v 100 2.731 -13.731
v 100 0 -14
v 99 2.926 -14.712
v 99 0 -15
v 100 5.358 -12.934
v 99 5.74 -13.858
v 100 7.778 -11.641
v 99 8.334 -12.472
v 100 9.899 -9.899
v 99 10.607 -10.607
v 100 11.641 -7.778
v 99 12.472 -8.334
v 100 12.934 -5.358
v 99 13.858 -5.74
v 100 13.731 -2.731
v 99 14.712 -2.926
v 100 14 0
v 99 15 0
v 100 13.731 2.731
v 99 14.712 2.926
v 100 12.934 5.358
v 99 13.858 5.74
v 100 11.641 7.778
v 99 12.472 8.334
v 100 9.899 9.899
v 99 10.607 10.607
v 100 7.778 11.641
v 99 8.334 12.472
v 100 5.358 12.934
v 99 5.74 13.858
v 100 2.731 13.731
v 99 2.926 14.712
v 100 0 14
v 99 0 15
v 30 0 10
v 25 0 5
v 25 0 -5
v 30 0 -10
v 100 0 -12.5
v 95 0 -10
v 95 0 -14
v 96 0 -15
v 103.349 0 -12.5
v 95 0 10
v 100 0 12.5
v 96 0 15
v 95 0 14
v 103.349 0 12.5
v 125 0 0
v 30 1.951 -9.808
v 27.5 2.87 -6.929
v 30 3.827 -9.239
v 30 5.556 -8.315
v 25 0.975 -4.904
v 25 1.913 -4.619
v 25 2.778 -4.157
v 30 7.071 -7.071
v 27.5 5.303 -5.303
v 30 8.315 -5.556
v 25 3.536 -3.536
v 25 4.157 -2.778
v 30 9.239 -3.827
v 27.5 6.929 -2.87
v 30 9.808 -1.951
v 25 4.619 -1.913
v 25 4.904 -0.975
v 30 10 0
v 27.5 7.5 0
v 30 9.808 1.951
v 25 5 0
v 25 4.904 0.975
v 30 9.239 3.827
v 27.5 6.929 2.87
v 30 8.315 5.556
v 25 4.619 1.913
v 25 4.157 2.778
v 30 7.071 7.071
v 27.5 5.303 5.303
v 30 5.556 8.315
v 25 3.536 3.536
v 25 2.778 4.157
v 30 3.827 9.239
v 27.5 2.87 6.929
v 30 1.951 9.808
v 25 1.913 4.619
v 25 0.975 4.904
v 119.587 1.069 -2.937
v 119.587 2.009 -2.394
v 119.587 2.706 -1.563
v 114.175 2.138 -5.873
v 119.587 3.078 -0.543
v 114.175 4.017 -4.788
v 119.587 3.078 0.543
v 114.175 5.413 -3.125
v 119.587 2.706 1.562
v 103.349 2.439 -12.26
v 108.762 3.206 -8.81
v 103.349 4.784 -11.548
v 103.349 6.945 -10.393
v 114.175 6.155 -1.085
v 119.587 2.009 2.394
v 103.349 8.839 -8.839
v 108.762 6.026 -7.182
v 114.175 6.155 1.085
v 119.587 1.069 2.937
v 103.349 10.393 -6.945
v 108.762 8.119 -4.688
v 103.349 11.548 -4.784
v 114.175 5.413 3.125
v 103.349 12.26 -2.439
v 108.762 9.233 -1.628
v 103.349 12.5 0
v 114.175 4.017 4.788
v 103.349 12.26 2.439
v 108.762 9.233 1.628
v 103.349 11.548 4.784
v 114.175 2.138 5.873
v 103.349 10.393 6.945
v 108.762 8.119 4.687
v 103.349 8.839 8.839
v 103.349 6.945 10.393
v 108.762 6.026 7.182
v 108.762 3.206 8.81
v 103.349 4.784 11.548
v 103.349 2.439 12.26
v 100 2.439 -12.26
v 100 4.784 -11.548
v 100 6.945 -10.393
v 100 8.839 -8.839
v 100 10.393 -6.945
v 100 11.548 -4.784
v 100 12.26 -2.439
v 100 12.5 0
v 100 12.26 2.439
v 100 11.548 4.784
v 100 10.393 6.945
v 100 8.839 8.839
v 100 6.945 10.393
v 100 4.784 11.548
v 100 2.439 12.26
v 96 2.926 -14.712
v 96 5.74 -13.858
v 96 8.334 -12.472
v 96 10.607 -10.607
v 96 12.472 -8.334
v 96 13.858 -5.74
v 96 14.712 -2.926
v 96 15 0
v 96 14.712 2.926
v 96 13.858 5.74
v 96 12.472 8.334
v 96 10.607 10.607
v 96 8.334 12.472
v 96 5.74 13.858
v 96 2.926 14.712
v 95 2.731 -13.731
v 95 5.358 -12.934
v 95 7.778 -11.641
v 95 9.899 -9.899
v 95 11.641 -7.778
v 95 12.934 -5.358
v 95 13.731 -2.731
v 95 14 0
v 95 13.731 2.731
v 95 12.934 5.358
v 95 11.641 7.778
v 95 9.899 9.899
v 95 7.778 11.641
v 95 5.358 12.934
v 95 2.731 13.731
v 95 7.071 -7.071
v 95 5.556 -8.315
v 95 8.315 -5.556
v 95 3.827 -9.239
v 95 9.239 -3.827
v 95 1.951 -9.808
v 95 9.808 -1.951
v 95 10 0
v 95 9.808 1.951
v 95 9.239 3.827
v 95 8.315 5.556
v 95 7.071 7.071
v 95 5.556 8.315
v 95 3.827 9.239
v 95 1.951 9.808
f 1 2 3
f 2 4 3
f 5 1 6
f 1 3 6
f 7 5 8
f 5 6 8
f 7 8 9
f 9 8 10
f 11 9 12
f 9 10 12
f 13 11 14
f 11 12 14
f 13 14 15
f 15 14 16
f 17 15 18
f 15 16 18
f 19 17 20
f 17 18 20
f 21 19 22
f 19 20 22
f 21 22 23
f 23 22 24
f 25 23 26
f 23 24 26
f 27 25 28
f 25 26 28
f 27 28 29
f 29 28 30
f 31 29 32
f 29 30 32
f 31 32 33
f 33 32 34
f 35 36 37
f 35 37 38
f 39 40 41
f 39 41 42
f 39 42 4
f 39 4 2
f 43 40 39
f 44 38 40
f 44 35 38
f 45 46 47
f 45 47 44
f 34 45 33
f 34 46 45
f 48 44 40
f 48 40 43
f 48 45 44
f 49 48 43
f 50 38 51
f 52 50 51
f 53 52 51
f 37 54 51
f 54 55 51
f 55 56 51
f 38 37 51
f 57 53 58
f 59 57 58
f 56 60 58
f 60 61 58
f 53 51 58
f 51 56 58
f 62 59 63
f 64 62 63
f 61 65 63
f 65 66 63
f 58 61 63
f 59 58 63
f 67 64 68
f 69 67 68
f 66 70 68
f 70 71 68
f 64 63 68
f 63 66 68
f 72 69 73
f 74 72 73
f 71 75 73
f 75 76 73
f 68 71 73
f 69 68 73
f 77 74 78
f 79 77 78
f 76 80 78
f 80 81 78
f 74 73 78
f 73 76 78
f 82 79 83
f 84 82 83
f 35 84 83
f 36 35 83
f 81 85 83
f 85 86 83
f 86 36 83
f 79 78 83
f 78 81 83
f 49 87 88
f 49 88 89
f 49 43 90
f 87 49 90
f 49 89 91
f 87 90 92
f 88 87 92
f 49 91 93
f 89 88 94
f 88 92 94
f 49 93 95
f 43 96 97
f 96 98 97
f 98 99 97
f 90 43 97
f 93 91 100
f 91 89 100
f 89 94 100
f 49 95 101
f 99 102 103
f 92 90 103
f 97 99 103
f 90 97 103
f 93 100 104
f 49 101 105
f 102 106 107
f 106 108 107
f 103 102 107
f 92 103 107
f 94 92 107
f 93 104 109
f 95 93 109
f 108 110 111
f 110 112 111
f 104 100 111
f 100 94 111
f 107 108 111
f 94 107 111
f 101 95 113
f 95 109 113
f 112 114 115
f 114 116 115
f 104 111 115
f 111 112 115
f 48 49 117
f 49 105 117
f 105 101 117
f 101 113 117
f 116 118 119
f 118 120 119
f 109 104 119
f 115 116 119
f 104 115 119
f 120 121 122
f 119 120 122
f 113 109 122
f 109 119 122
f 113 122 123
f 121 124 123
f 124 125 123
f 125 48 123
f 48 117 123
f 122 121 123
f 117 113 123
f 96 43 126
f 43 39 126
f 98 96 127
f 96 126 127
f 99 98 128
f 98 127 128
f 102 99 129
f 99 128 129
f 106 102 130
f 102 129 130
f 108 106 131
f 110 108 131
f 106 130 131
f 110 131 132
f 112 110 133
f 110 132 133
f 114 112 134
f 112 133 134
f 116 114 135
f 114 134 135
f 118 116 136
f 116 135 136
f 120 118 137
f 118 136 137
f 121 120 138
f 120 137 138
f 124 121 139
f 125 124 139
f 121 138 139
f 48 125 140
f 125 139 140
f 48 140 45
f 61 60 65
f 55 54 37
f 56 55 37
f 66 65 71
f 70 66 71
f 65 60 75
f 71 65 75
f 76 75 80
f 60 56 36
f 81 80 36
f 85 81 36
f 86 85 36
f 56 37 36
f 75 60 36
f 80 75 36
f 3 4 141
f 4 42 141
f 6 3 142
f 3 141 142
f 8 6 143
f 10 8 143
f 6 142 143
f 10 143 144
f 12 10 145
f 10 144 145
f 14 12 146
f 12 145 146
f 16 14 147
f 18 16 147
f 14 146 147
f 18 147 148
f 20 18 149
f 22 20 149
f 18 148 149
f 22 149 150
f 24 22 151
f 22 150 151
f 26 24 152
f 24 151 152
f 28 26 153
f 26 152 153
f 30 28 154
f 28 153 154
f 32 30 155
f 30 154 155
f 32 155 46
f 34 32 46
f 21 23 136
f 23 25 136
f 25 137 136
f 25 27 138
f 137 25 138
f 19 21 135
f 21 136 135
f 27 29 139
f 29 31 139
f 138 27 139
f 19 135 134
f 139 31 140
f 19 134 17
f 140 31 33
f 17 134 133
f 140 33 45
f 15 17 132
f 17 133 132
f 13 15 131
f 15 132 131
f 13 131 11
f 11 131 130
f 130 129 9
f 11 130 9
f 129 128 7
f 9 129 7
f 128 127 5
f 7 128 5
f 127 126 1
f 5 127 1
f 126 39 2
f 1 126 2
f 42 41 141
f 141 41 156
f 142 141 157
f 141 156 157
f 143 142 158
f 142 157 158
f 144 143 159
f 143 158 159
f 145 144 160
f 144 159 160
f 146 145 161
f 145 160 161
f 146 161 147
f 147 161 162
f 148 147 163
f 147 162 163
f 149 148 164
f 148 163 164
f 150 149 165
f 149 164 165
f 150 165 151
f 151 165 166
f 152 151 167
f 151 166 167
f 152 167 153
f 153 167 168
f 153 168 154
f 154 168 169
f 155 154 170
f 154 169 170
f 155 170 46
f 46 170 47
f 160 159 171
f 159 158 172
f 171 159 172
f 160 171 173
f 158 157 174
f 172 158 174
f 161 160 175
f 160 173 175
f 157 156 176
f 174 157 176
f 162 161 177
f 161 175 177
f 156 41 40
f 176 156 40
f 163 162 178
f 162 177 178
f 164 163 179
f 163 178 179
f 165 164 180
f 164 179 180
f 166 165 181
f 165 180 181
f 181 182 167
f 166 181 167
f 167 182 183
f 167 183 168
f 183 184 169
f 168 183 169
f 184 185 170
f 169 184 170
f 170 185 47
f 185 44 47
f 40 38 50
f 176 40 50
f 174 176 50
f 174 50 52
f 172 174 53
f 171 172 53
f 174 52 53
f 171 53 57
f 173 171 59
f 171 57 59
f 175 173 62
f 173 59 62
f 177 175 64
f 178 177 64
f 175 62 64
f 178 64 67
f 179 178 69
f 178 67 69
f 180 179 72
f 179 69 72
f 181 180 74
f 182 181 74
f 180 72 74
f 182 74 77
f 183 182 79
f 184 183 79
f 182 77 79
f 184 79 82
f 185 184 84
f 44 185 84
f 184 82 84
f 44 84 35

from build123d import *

# Parameters (mm, degrees)
F2_SIZE  = 1
F3_SIZE  = 5
F5_W     = 154.381274
F5_H     = 110.501114
F6_DEPTH = 25


with BuildPart() as f1:
    # F0 (on Front) → F1 (revolve)
    with BuildSketch(Plane.XZ):
        Polygon((95, 10), (25, 10), (25, 0), (125, 0), (103.349365, 12.5), (100, 12.5), (100, 15), (95, 15), align=None)
    revolve(axis=Axis((75, 0, 0), (1, 0, 0)))

    # F2
    f2_edges = [f1.edges().sort_by_distance(p)[0] for p in [
        (100, 0, -15),
        (95, 0, -15),
    ]]
    chamfer(f2_edges, length=F2_SIZE)

    # F3
    f3_edges = [f1.edges().sort_by_distance(p)[0] for p in [
        (25, 0, -10),
    ]]
    chamfer(f3_edges, length=F3_SIZE)

    # F5 (on offset) → F6 (cut)
    with BuildSketch(Plane.XZ.offset(25)):
        with Locations((66.994385, 19.205375)):
            Rectangle(F5_W, F5_H)
    extrude(amount=-F6_DEPTH, mode=Mode.SUBTRACT)


solid = f1.part
